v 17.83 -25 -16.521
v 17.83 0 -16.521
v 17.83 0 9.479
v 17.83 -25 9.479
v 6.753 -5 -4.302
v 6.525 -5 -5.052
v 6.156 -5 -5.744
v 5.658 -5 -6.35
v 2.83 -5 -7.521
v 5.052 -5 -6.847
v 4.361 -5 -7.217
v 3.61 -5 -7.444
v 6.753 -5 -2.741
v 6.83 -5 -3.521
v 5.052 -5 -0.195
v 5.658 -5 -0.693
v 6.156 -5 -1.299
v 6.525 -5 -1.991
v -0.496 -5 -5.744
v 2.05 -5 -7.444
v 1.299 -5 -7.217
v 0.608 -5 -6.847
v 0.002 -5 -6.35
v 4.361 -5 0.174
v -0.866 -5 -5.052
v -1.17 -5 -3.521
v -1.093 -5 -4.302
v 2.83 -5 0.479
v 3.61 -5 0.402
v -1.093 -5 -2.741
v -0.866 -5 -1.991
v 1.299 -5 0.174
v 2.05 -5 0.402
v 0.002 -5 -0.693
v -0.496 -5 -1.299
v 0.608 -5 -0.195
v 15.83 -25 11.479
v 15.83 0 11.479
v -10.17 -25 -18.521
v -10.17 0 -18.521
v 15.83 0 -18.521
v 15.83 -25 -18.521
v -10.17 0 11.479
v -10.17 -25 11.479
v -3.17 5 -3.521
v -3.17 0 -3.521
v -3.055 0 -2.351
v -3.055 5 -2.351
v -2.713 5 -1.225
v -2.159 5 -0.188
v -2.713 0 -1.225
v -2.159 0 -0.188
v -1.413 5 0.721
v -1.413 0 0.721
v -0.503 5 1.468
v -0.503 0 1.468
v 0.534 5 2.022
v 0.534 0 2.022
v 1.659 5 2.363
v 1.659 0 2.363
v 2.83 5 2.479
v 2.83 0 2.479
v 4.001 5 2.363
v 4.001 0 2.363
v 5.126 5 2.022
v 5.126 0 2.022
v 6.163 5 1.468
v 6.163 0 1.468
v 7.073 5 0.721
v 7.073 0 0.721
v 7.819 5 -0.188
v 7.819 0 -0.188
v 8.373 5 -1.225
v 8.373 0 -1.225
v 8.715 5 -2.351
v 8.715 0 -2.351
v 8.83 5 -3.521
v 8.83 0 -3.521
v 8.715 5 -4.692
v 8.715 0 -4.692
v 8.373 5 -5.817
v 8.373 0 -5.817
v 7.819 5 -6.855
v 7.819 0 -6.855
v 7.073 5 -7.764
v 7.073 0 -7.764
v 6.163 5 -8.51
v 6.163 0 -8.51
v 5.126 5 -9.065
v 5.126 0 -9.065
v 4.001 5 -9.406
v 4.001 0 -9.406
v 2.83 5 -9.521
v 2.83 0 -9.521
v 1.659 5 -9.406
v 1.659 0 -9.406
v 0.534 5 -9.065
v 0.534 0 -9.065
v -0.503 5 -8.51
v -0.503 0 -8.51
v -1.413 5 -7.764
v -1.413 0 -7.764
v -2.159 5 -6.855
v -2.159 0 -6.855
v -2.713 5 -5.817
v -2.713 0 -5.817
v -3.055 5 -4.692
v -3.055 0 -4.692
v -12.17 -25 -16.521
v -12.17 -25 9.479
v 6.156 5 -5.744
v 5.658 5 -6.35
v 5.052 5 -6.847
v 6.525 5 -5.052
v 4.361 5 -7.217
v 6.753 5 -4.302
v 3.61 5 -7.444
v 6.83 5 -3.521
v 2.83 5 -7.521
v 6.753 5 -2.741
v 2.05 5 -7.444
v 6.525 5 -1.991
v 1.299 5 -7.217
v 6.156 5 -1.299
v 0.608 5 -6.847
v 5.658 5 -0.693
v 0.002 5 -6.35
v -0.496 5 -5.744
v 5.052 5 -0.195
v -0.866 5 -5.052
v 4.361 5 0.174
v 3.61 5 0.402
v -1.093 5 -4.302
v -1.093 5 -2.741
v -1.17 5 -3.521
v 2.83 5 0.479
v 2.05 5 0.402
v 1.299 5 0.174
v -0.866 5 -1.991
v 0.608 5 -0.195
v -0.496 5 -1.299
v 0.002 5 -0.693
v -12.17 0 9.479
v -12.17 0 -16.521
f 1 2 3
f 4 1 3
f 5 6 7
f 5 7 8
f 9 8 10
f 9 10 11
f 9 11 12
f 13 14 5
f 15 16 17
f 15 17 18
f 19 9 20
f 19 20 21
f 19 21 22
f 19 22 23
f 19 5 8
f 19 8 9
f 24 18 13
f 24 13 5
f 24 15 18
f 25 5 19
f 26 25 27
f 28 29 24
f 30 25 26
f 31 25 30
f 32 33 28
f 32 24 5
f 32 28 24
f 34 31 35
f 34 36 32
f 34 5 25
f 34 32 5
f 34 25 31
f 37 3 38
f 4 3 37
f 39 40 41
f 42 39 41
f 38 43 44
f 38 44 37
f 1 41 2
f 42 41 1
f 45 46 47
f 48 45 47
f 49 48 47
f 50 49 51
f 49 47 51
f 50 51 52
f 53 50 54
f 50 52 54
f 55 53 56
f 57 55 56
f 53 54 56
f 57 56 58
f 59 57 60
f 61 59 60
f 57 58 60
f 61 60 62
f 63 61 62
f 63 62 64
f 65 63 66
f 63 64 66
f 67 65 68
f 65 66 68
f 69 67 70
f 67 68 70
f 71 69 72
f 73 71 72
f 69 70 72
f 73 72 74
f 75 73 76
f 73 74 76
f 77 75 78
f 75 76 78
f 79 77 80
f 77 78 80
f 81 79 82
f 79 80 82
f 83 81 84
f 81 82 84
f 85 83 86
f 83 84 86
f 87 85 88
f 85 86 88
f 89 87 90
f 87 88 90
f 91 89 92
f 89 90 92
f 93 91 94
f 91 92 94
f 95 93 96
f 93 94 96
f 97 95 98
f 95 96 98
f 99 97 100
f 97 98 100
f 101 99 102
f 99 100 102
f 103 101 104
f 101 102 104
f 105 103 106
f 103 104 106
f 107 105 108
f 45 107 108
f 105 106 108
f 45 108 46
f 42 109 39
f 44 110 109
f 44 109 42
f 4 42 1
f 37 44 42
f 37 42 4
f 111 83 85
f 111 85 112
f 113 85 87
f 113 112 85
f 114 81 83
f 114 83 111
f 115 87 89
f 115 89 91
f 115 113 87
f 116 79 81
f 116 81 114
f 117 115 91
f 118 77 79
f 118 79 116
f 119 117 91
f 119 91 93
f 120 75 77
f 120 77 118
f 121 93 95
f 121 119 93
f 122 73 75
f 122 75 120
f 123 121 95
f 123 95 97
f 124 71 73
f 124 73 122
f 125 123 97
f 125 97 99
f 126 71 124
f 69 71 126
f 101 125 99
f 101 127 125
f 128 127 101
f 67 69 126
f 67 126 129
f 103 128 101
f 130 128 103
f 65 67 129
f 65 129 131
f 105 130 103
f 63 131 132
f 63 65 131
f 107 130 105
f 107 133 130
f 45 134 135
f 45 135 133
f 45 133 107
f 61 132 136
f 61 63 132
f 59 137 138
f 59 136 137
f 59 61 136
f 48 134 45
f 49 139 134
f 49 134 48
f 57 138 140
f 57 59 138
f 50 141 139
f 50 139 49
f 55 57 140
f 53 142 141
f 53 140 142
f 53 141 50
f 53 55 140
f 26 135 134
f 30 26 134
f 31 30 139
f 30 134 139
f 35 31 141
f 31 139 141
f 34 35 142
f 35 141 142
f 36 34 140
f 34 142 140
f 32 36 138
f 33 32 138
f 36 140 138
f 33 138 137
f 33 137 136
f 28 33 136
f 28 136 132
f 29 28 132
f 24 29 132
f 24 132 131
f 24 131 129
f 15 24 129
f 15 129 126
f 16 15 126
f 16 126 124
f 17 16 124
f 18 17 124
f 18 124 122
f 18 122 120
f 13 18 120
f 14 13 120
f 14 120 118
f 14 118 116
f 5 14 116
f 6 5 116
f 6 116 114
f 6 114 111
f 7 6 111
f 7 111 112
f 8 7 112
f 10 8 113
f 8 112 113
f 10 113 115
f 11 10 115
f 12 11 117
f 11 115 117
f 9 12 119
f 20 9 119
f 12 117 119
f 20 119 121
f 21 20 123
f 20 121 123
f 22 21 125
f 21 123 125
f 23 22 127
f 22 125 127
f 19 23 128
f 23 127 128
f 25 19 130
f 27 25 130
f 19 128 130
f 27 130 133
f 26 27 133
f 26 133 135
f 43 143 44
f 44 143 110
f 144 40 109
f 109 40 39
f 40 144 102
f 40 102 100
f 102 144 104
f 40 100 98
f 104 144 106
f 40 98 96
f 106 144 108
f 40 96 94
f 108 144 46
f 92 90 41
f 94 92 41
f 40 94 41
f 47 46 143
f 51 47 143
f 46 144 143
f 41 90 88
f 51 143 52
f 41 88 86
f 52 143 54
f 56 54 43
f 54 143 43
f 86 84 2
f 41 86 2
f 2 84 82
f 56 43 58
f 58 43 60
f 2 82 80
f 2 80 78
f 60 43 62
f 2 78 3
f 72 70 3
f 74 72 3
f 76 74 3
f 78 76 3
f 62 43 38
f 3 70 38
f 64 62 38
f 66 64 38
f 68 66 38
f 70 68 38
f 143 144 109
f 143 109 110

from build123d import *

# Parameters (mm, degrees)
F0_W      = 30
F0_H      = 30
F1_DEPTH  = 25
F3_R      = 6
F4_DEPTH  = 5
F5_SIZE   = 2
F6_SIZE   = 2
F7_SIZE   = 2
F2_R      = 4
F8_DEPTH  = 5
F9_R      = 4
F10_DEPTH = 5


with BuildPart() as f1:
    # F0 (on Front) → F1 (new body)
    with BuildSketch(Plane.XZ):
        with Locations((2.829975, -3.521299)):
            Rectangle(F0_W, F0_H)
    extrude(amount=F1_DEPTH)

    # F3 (on face) → F4 (join)
    with BuildSketch(Plane(origin=(0, 0, 0), x_dir=(-1, 0, 0), z_dir=(0, 1, 0))):
        with Locations((-2.829975, -3.521299)):
            Circle(F3_R)
    extrude(amount=F4_DEPTH)

    # F5
    f5_edges = [f1.edges().sort_by_distance(p)[0] for p in [
        (17.829975, -12.5, 11.478701),
    ]]
    chamfer(f5_edges, length=F5_SIZE)

    # F6
    f6_edges = [f1.edges().sort_by_distance(p)[0] for p in [
        (-12.170025, -12.5, 11.478701),
    ]]
    chamfer(f6_edges, length=F6_SIZE)

    # F7
    f7_edges = [f1.edges().sort_by_distance(p)[0] for p in [
        (-12.170025, -12.5, -18.521299),
        (17.829975, -12.5, -18.521299),
    ]]
    chamfer(f7_edges, length=F7_SIZE)

    # F2 (on face) → F8 (cut)
    with BuildSketch(Plane(origin=(0, 0, 0), x_dir=(-1, 0, 0), z_dir=(0, 1, 0))):
        with Locations((-2.829975, -3.521299)):
            Circle(F2_R)
    extrude(amount=-F8_DEPTH, mode=Mode.SUBTRACT)

    # F9 (on face) → F10 (cut)
    with BuildSketch(Plane(origin=(0, 5, 0), x_dir=(-1, 0, 0), z_dir=(0, 1, 0))):
        with Locations((-2.829975, -3.521299)):
            Circle(F9_R)
    extrude(amount=-F10_DEPTH, mode=Mode.SUBTRACT)


solid = f1.part
